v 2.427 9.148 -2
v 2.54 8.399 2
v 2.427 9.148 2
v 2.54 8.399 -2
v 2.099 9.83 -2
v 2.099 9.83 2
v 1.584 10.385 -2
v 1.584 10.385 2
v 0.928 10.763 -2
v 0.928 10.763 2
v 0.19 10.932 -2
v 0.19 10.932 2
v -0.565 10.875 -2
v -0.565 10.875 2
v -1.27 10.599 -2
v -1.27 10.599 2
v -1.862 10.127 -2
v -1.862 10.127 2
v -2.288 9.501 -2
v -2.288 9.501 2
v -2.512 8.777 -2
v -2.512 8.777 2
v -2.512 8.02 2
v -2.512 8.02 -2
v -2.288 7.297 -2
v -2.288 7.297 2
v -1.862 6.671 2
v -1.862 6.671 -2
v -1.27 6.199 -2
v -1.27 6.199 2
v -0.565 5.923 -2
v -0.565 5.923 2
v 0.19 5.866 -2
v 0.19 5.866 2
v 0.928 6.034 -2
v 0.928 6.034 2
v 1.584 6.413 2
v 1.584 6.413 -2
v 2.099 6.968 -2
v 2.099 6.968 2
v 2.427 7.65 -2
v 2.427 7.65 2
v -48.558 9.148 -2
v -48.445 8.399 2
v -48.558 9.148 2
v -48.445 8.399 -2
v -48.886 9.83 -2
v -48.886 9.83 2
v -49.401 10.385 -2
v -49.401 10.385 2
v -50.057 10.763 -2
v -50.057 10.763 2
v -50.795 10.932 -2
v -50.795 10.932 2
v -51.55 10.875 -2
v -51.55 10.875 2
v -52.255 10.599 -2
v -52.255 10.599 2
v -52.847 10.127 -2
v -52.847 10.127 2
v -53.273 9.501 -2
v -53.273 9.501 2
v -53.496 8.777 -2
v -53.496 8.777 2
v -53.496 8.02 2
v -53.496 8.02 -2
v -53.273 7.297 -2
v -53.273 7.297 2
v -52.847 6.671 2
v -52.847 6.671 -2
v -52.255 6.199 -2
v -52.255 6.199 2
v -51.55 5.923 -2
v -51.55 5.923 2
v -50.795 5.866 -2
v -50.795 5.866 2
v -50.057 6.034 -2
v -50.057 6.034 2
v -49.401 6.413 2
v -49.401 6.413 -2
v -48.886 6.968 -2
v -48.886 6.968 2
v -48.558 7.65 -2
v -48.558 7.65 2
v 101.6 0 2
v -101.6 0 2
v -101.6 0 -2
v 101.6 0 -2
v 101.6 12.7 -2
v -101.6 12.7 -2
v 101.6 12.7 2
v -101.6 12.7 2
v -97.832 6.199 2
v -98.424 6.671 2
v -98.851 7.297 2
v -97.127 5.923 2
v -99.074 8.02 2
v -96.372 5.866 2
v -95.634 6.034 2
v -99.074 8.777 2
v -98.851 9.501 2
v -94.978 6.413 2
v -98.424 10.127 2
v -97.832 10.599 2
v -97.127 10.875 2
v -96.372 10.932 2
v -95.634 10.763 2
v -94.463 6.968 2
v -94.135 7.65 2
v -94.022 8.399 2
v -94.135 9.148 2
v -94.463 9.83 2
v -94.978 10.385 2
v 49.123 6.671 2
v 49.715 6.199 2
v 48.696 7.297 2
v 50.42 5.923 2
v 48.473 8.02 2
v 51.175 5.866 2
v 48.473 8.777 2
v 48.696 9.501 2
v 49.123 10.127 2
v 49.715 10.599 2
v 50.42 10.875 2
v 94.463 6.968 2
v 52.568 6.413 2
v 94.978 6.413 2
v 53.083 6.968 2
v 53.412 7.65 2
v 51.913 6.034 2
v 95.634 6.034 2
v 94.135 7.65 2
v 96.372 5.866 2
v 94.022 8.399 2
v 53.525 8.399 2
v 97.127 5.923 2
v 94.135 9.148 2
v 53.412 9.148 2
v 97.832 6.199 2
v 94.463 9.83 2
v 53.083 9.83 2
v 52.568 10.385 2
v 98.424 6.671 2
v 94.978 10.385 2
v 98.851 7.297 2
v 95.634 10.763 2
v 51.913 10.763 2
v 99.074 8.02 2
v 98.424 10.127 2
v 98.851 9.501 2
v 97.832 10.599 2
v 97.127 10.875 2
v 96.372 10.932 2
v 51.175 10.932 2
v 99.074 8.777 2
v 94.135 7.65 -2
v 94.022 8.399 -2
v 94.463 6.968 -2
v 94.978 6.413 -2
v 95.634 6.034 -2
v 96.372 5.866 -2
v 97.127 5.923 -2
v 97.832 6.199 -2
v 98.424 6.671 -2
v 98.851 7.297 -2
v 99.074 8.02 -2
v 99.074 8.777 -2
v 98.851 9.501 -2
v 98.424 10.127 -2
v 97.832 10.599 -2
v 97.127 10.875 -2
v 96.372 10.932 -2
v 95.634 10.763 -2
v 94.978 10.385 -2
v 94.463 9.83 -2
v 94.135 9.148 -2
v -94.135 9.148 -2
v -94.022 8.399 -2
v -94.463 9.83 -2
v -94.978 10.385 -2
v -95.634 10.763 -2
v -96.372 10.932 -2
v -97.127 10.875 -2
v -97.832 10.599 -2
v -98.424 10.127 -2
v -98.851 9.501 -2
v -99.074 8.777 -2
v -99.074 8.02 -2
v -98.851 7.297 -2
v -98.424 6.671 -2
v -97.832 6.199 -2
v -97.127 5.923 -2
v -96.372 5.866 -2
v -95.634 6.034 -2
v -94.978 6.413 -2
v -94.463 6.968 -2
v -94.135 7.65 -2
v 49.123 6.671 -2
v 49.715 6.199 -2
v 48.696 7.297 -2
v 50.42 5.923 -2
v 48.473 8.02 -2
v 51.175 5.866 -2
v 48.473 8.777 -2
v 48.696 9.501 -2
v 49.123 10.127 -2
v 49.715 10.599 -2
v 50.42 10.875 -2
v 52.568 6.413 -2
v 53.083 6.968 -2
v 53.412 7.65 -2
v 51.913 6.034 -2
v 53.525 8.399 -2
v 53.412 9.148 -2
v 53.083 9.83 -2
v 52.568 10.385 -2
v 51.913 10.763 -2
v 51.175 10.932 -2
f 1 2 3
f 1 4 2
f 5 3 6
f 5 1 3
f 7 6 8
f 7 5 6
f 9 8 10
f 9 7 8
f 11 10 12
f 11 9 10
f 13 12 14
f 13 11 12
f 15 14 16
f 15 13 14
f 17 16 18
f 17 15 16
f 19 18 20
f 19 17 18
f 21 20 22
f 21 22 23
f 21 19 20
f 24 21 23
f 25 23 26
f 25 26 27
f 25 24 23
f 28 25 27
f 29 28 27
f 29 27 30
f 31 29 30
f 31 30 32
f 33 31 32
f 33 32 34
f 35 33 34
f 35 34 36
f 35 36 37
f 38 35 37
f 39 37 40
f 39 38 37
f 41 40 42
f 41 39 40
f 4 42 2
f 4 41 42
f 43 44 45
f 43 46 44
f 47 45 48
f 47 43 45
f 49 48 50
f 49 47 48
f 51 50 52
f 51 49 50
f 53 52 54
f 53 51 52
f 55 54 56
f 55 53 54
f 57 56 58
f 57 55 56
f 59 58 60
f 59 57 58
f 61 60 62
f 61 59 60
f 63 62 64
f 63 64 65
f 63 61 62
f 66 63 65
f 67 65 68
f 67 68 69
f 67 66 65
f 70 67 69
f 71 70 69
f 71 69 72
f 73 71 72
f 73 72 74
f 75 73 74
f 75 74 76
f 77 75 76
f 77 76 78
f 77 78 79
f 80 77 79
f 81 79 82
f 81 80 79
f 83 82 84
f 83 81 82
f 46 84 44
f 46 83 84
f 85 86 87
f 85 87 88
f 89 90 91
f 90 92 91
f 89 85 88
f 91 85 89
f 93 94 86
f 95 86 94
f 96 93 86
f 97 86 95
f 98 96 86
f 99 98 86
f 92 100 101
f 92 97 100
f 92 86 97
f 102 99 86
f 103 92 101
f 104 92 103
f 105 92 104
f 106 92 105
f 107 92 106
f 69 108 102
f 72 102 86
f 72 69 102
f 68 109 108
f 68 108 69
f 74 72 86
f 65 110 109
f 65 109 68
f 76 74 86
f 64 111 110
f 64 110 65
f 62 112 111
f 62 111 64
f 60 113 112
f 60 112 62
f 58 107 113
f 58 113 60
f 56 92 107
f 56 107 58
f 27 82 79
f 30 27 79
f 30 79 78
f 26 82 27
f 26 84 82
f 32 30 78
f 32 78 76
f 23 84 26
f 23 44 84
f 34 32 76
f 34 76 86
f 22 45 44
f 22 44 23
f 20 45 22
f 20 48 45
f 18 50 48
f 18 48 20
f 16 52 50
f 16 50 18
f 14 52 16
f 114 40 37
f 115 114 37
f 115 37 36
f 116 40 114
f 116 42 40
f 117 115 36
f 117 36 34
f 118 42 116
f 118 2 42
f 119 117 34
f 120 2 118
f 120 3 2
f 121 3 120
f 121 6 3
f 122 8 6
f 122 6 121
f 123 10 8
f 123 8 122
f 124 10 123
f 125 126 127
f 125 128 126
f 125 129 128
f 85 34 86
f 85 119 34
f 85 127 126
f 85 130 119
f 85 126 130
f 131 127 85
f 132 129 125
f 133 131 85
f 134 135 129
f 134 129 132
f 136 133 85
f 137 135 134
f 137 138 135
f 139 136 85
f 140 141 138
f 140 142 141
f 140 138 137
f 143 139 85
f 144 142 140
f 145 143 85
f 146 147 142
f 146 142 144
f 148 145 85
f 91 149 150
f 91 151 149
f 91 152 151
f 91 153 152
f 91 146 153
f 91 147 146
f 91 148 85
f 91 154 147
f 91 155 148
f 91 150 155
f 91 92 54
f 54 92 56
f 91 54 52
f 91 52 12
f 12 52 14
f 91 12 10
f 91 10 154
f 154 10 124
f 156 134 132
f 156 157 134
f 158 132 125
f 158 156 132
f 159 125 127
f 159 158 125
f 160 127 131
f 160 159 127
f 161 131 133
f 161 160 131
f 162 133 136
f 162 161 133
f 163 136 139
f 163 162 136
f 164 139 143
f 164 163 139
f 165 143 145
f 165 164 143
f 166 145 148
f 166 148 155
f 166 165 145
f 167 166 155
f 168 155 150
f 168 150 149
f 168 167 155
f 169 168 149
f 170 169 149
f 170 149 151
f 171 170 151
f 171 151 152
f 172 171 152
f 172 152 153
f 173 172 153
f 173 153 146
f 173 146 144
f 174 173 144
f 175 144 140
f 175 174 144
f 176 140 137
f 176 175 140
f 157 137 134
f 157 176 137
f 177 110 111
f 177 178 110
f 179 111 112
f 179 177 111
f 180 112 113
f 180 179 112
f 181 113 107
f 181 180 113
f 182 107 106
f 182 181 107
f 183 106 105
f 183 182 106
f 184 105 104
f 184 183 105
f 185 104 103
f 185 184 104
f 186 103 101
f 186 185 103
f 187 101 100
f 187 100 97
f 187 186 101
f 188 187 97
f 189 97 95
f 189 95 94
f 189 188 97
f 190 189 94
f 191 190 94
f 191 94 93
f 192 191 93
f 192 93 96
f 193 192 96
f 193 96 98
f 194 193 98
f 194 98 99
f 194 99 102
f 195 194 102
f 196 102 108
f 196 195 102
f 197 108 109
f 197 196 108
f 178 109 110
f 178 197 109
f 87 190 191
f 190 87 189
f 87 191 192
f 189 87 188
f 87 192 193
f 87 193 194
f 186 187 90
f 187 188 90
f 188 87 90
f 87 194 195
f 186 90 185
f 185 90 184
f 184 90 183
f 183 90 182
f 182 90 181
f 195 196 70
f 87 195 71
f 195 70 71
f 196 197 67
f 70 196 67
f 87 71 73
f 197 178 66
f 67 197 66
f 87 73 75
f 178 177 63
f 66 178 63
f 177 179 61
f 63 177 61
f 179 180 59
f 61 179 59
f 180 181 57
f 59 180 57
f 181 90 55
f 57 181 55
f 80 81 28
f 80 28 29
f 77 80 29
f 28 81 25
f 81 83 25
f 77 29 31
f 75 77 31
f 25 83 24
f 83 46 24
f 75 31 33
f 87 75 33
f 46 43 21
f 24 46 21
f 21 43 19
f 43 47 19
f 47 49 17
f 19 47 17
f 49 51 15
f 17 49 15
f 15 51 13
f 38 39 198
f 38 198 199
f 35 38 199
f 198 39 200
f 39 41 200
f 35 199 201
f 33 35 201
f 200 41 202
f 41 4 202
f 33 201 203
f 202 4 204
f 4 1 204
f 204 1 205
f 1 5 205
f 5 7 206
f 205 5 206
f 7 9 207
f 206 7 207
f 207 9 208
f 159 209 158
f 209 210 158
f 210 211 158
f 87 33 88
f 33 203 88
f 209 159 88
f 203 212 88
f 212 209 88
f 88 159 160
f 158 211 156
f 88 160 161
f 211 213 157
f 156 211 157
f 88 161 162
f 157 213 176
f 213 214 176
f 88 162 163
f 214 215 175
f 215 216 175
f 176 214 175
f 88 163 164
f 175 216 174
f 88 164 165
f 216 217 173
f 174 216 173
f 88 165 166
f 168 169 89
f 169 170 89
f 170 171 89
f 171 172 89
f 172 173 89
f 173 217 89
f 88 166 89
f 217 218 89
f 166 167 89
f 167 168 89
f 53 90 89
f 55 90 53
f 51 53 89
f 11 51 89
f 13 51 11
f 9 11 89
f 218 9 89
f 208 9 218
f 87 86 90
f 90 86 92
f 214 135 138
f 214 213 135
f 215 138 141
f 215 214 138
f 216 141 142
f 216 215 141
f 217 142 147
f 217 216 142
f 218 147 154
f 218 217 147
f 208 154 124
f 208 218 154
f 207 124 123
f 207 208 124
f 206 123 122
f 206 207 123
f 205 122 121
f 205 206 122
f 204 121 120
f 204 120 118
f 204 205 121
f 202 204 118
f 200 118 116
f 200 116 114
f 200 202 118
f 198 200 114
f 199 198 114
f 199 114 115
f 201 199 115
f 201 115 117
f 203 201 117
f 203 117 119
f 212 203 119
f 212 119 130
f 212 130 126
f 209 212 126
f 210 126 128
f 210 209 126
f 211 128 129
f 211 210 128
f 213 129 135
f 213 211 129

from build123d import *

# Parameters (mm, degrees)
SKETCH2_W           = 203.2
SKETCH2_H           = 12.7
SKETCH2_R           = 2.54
BOSS_EXTRUDE2_DEPTH = 2


with BuildPart() as part:
    # Sketch2 → Boss-Extrude2 (new, symmetric)
    with BuildSketch(Plane.XY):
        with Locations((0, 6.35)):
            Rectangle(SKETCH2_W, SKETCH2_H)
        with Locations((-96.562042846, 8.398896076)):
            Circle(SKETCH2_R, mode=Mode.SUBTRACT)
        with Locations((-50.984733006, 8.398896076)):
            Circle(SKETCH2_R, mode=Mode.SUBTRACT)
        with Locations(Location((96.562042846, 8.398896076, 0), (0, 0, 180))):
            Circle(SKETCH2_R, mode=Mode.SUBTRACT)
        with Locations((0, 8.398896076)):
            Circle(SKETCH2_R, mode=Mode.SUBTRACT)
        with Locations((50.984733006, 8.398896076)):
            Circle(SKETCH2_R, mode=Mode.SUBTRACT)
    extrude(amount=BOSS_EXTRUDE2_DEPTH, both=True)


solid = part.part
